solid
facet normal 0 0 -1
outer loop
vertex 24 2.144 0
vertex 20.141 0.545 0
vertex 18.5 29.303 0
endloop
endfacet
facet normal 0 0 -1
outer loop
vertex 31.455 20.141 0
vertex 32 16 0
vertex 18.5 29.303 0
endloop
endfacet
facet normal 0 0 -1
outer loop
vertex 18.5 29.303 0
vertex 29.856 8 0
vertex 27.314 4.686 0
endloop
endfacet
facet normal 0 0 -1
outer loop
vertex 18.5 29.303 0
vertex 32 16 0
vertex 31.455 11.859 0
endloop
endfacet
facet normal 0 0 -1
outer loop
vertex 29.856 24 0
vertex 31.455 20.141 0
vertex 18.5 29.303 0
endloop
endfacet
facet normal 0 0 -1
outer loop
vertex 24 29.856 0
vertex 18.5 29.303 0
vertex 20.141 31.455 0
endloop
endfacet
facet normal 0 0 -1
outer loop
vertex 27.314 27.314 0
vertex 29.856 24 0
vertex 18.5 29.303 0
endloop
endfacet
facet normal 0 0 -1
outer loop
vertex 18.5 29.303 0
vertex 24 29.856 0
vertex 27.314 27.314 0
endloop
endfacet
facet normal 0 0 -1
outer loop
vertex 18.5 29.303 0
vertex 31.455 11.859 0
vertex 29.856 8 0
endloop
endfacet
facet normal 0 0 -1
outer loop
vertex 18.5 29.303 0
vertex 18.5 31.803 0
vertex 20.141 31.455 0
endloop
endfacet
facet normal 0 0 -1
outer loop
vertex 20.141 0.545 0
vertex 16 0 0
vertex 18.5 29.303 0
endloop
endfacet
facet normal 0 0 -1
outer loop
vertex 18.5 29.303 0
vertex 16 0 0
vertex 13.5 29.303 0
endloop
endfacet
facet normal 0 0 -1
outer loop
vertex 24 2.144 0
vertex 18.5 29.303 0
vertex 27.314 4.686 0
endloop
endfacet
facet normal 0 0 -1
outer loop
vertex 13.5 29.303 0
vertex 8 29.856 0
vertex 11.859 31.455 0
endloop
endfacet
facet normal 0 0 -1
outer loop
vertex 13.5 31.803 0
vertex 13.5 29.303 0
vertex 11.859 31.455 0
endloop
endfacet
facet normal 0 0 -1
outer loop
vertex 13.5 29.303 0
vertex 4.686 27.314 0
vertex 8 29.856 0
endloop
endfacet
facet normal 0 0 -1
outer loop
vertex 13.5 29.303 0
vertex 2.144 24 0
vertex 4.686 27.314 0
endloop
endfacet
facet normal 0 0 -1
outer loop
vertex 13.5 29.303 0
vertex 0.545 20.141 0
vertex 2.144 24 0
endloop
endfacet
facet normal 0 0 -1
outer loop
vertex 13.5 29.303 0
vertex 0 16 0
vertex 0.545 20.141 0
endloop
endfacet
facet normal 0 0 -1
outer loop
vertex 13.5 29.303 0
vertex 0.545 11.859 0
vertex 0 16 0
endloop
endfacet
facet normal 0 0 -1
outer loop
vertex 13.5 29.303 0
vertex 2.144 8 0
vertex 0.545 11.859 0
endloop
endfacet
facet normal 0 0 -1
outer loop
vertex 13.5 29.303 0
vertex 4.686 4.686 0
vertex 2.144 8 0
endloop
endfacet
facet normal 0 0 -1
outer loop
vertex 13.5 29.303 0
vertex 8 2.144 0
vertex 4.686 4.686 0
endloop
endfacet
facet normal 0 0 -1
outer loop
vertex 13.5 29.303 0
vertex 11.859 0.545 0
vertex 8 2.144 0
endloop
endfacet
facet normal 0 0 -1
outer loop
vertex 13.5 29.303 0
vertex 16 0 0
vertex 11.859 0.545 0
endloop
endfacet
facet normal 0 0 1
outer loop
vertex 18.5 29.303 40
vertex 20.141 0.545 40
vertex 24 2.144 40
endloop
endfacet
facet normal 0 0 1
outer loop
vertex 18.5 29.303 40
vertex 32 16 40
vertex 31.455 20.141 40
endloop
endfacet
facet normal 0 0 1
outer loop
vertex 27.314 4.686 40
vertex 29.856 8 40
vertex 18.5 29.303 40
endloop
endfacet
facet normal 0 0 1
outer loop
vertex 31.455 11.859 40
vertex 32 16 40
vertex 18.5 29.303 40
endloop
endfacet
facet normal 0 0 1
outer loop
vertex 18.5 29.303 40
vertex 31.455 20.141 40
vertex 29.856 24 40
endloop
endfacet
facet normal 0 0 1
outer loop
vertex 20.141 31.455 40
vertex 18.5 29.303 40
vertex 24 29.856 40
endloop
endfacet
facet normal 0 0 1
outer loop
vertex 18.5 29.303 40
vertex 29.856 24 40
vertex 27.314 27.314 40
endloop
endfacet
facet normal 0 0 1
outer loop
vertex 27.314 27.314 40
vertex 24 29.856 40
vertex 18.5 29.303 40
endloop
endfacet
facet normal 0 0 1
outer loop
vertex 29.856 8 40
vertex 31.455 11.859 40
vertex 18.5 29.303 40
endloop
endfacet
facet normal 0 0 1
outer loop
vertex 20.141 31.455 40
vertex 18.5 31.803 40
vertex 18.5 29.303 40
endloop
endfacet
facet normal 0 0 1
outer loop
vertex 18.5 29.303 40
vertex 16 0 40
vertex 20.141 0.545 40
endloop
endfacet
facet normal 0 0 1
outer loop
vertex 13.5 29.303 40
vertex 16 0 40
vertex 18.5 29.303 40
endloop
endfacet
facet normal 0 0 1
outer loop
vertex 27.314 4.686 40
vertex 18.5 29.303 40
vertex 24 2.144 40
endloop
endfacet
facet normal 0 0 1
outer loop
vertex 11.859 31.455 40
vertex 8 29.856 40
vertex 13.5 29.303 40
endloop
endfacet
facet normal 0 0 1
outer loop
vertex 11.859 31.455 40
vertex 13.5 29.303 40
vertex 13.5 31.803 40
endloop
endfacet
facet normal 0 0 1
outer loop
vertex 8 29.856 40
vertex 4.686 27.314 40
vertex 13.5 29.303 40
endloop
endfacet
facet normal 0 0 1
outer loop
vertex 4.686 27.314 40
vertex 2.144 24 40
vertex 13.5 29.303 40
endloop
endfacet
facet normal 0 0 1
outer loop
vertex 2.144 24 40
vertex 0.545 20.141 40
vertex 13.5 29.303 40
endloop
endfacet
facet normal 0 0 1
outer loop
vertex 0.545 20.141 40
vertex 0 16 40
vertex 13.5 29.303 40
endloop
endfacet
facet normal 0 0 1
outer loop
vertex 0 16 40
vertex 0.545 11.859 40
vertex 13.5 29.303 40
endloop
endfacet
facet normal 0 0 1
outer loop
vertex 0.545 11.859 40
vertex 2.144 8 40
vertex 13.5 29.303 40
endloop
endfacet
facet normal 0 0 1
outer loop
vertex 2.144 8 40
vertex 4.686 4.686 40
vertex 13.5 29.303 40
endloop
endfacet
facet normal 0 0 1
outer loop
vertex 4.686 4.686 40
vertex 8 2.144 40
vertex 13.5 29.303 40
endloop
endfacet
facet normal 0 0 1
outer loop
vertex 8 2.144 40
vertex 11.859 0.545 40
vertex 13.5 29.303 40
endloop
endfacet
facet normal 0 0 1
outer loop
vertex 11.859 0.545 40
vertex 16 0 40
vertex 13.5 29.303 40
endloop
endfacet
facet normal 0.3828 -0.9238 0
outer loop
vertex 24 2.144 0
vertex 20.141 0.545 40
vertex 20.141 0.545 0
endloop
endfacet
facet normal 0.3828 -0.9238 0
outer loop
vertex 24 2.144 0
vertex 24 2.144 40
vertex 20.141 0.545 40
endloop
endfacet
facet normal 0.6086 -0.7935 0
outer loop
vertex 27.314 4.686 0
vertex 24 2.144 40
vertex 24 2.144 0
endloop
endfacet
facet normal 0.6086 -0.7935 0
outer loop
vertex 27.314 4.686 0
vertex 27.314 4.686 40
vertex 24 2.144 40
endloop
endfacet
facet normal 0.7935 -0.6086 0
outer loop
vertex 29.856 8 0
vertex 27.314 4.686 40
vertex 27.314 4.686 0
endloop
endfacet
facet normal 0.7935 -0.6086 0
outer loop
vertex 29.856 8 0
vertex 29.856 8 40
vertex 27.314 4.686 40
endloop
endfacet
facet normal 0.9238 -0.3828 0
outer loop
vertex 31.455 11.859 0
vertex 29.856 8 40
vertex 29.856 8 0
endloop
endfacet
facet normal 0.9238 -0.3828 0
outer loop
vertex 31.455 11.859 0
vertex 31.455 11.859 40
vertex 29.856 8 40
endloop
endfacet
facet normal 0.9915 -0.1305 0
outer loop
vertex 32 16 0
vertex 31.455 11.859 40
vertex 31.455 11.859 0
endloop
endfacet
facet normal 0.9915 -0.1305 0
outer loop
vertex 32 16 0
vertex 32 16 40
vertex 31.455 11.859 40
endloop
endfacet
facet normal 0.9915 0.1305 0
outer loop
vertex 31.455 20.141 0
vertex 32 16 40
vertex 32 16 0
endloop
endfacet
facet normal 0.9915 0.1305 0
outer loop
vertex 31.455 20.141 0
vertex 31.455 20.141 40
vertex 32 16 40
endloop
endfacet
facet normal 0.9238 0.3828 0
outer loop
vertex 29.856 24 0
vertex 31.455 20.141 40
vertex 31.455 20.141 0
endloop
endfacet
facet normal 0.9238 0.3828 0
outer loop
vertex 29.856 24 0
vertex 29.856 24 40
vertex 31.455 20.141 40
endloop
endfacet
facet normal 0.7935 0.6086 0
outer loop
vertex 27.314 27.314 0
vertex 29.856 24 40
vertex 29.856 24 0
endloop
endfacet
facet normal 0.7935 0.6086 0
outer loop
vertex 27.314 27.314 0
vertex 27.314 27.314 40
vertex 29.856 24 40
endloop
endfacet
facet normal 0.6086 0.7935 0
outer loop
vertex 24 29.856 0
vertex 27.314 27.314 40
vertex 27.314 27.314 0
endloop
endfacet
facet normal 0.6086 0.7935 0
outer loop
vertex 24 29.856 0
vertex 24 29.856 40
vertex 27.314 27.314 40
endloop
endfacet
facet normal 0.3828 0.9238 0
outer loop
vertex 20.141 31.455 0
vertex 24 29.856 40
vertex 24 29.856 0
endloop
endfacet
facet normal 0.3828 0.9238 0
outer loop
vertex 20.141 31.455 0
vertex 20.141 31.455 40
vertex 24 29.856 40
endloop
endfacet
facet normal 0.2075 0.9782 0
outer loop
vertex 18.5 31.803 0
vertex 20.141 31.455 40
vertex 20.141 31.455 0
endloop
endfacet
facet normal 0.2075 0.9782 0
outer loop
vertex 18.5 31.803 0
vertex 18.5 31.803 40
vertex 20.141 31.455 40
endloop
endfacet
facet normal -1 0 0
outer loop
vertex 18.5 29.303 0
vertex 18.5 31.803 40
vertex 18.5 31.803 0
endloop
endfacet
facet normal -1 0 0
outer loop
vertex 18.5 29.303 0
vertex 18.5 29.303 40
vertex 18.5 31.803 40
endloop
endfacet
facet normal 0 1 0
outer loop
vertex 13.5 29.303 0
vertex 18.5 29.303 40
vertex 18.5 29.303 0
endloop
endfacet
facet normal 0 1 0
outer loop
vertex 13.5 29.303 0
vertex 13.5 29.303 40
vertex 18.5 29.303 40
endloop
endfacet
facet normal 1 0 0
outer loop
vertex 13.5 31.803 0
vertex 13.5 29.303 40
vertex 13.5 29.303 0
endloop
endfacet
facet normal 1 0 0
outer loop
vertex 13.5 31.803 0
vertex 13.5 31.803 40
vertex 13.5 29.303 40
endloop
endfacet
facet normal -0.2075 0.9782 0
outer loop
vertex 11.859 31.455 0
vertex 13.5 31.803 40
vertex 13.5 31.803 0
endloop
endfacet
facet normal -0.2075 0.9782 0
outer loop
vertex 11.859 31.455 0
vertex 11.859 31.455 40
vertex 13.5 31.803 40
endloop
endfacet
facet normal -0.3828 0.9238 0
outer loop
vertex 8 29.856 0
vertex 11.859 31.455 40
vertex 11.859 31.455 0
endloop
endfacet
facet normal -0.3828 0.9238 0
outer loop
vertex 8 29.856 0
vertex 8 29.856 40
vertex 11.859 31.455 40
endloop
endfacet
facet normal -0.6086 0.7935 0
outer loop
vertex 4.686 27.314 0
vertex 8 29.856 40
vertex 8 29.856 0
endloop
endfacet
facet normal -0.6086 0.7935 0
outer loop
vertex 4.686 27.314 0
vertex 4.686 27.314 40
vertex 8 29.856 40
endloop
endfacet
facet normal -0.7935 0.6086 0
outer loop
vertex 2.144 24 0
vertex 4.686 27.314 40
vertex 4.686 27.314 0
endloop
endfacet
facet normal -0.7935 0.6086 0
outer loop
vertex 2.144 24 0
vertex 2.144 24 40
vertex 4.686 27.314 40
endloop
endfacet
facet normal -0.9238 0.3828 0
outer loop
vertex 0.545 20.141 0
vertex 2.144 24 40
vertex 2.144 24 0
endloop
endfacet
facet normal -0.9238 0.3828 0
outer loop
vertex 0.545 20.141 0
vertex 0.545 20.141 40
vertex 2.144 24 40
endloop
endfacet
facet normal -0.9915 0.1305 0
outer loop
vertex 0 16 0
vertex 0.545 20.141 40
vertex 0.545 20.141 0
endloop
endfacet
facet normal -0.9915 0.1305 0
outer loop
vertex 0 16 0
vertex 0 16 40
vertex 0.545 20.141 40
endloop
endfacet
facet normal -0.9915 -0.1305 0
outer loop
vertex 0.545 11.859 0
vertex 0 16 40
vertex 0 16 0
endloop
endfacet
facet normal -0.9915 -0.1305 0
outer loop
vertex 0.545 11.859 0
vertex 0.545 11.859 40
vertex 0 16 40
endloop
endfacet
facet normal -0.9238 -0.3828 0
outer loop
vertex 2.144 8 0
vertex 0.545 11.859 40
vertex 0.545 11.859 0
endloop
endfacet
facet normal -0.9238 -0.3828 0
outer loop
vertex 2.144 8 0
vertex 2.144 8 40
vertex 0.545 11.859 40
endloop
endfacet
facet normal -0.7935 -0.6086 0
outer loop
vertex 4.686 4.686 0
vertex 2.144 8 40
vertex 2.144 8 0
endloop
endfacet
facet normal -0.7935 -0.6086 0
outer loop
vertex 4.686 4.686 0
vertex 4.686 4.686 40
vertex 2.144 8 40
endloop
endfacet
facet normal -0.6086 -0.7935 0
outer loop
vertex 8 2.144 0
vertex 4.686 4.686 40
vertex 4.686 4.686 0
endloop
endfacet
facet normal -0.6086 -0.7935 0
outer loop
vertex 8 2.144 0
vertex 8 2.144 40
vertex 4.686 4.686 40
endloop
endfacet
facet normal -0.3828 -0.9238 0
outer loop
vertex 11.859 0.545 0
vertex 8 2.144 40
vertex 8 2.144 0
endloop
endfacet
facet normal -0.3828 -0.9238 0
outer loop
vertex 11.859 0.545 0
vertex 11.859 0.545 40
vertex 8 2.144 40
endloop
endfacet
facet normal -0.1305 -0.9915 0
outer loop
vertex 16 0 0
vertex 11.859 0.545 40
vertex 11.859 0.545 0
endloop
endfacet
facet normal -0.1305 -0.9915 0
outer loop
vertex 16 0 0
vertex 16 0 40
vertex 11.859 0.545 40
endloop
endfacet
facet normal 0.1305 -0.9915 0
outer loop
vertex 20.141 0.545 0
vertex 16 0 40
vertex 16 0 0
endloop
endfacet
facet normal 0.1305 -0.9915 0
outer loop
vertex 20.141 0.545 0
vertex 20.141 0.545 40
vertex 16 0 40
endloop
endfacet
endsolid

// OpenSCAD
$fn = 32;

// ----------------------------------------------------------------------
// Keyway shaft: d32 shaft, key 5 x 2.5 mm
// ----------------------------------------------------------------------

// --- parameters (mm) ---
shaft_r = 16;             // shaft radius
key_w = 5;                // keyway width
key_d = 2.5;              // keyway depth below the surface line
plate_t = 40;             // shaft length, Z (extrusion height)
fit_tol = 0.05;           // declared fit tolerance (prompt contract)
free_tol = 0.3;           // declared free tolerance (prompt contract)

shaft_d = 2 * shaft_r;  // shaft diameter
circle_step = 15;  // polygon sampling step, degrees

profile = [[11.859, 31.455], [8, 29.856], [4.686, 27.314], [2.144, 24], [0.545, 20.141], [0, 16], [0.545, 11.859], [2.144, 8], [4.686, 4.686], [8, 2.144], [11.859, 0.545], [16, 0], [20.141, 0.545], [24, 2.144], [27.314, 4.686], [29.856, 8], [31.455, 11.859], [32, 16], [31.455, 20.141], [29.856, 24], [27.314, 27.314], [24, 29.856], [20.141, 31.455], [18.5, 31.803], [18.5, 29.303], [13.5, 29.303], [13.5, 31.803]];  // primary outline, 27 points, counter clockwise

// --- the one profile operation ---
linear_extrude(height = plate_t) polygon(points = profile);
